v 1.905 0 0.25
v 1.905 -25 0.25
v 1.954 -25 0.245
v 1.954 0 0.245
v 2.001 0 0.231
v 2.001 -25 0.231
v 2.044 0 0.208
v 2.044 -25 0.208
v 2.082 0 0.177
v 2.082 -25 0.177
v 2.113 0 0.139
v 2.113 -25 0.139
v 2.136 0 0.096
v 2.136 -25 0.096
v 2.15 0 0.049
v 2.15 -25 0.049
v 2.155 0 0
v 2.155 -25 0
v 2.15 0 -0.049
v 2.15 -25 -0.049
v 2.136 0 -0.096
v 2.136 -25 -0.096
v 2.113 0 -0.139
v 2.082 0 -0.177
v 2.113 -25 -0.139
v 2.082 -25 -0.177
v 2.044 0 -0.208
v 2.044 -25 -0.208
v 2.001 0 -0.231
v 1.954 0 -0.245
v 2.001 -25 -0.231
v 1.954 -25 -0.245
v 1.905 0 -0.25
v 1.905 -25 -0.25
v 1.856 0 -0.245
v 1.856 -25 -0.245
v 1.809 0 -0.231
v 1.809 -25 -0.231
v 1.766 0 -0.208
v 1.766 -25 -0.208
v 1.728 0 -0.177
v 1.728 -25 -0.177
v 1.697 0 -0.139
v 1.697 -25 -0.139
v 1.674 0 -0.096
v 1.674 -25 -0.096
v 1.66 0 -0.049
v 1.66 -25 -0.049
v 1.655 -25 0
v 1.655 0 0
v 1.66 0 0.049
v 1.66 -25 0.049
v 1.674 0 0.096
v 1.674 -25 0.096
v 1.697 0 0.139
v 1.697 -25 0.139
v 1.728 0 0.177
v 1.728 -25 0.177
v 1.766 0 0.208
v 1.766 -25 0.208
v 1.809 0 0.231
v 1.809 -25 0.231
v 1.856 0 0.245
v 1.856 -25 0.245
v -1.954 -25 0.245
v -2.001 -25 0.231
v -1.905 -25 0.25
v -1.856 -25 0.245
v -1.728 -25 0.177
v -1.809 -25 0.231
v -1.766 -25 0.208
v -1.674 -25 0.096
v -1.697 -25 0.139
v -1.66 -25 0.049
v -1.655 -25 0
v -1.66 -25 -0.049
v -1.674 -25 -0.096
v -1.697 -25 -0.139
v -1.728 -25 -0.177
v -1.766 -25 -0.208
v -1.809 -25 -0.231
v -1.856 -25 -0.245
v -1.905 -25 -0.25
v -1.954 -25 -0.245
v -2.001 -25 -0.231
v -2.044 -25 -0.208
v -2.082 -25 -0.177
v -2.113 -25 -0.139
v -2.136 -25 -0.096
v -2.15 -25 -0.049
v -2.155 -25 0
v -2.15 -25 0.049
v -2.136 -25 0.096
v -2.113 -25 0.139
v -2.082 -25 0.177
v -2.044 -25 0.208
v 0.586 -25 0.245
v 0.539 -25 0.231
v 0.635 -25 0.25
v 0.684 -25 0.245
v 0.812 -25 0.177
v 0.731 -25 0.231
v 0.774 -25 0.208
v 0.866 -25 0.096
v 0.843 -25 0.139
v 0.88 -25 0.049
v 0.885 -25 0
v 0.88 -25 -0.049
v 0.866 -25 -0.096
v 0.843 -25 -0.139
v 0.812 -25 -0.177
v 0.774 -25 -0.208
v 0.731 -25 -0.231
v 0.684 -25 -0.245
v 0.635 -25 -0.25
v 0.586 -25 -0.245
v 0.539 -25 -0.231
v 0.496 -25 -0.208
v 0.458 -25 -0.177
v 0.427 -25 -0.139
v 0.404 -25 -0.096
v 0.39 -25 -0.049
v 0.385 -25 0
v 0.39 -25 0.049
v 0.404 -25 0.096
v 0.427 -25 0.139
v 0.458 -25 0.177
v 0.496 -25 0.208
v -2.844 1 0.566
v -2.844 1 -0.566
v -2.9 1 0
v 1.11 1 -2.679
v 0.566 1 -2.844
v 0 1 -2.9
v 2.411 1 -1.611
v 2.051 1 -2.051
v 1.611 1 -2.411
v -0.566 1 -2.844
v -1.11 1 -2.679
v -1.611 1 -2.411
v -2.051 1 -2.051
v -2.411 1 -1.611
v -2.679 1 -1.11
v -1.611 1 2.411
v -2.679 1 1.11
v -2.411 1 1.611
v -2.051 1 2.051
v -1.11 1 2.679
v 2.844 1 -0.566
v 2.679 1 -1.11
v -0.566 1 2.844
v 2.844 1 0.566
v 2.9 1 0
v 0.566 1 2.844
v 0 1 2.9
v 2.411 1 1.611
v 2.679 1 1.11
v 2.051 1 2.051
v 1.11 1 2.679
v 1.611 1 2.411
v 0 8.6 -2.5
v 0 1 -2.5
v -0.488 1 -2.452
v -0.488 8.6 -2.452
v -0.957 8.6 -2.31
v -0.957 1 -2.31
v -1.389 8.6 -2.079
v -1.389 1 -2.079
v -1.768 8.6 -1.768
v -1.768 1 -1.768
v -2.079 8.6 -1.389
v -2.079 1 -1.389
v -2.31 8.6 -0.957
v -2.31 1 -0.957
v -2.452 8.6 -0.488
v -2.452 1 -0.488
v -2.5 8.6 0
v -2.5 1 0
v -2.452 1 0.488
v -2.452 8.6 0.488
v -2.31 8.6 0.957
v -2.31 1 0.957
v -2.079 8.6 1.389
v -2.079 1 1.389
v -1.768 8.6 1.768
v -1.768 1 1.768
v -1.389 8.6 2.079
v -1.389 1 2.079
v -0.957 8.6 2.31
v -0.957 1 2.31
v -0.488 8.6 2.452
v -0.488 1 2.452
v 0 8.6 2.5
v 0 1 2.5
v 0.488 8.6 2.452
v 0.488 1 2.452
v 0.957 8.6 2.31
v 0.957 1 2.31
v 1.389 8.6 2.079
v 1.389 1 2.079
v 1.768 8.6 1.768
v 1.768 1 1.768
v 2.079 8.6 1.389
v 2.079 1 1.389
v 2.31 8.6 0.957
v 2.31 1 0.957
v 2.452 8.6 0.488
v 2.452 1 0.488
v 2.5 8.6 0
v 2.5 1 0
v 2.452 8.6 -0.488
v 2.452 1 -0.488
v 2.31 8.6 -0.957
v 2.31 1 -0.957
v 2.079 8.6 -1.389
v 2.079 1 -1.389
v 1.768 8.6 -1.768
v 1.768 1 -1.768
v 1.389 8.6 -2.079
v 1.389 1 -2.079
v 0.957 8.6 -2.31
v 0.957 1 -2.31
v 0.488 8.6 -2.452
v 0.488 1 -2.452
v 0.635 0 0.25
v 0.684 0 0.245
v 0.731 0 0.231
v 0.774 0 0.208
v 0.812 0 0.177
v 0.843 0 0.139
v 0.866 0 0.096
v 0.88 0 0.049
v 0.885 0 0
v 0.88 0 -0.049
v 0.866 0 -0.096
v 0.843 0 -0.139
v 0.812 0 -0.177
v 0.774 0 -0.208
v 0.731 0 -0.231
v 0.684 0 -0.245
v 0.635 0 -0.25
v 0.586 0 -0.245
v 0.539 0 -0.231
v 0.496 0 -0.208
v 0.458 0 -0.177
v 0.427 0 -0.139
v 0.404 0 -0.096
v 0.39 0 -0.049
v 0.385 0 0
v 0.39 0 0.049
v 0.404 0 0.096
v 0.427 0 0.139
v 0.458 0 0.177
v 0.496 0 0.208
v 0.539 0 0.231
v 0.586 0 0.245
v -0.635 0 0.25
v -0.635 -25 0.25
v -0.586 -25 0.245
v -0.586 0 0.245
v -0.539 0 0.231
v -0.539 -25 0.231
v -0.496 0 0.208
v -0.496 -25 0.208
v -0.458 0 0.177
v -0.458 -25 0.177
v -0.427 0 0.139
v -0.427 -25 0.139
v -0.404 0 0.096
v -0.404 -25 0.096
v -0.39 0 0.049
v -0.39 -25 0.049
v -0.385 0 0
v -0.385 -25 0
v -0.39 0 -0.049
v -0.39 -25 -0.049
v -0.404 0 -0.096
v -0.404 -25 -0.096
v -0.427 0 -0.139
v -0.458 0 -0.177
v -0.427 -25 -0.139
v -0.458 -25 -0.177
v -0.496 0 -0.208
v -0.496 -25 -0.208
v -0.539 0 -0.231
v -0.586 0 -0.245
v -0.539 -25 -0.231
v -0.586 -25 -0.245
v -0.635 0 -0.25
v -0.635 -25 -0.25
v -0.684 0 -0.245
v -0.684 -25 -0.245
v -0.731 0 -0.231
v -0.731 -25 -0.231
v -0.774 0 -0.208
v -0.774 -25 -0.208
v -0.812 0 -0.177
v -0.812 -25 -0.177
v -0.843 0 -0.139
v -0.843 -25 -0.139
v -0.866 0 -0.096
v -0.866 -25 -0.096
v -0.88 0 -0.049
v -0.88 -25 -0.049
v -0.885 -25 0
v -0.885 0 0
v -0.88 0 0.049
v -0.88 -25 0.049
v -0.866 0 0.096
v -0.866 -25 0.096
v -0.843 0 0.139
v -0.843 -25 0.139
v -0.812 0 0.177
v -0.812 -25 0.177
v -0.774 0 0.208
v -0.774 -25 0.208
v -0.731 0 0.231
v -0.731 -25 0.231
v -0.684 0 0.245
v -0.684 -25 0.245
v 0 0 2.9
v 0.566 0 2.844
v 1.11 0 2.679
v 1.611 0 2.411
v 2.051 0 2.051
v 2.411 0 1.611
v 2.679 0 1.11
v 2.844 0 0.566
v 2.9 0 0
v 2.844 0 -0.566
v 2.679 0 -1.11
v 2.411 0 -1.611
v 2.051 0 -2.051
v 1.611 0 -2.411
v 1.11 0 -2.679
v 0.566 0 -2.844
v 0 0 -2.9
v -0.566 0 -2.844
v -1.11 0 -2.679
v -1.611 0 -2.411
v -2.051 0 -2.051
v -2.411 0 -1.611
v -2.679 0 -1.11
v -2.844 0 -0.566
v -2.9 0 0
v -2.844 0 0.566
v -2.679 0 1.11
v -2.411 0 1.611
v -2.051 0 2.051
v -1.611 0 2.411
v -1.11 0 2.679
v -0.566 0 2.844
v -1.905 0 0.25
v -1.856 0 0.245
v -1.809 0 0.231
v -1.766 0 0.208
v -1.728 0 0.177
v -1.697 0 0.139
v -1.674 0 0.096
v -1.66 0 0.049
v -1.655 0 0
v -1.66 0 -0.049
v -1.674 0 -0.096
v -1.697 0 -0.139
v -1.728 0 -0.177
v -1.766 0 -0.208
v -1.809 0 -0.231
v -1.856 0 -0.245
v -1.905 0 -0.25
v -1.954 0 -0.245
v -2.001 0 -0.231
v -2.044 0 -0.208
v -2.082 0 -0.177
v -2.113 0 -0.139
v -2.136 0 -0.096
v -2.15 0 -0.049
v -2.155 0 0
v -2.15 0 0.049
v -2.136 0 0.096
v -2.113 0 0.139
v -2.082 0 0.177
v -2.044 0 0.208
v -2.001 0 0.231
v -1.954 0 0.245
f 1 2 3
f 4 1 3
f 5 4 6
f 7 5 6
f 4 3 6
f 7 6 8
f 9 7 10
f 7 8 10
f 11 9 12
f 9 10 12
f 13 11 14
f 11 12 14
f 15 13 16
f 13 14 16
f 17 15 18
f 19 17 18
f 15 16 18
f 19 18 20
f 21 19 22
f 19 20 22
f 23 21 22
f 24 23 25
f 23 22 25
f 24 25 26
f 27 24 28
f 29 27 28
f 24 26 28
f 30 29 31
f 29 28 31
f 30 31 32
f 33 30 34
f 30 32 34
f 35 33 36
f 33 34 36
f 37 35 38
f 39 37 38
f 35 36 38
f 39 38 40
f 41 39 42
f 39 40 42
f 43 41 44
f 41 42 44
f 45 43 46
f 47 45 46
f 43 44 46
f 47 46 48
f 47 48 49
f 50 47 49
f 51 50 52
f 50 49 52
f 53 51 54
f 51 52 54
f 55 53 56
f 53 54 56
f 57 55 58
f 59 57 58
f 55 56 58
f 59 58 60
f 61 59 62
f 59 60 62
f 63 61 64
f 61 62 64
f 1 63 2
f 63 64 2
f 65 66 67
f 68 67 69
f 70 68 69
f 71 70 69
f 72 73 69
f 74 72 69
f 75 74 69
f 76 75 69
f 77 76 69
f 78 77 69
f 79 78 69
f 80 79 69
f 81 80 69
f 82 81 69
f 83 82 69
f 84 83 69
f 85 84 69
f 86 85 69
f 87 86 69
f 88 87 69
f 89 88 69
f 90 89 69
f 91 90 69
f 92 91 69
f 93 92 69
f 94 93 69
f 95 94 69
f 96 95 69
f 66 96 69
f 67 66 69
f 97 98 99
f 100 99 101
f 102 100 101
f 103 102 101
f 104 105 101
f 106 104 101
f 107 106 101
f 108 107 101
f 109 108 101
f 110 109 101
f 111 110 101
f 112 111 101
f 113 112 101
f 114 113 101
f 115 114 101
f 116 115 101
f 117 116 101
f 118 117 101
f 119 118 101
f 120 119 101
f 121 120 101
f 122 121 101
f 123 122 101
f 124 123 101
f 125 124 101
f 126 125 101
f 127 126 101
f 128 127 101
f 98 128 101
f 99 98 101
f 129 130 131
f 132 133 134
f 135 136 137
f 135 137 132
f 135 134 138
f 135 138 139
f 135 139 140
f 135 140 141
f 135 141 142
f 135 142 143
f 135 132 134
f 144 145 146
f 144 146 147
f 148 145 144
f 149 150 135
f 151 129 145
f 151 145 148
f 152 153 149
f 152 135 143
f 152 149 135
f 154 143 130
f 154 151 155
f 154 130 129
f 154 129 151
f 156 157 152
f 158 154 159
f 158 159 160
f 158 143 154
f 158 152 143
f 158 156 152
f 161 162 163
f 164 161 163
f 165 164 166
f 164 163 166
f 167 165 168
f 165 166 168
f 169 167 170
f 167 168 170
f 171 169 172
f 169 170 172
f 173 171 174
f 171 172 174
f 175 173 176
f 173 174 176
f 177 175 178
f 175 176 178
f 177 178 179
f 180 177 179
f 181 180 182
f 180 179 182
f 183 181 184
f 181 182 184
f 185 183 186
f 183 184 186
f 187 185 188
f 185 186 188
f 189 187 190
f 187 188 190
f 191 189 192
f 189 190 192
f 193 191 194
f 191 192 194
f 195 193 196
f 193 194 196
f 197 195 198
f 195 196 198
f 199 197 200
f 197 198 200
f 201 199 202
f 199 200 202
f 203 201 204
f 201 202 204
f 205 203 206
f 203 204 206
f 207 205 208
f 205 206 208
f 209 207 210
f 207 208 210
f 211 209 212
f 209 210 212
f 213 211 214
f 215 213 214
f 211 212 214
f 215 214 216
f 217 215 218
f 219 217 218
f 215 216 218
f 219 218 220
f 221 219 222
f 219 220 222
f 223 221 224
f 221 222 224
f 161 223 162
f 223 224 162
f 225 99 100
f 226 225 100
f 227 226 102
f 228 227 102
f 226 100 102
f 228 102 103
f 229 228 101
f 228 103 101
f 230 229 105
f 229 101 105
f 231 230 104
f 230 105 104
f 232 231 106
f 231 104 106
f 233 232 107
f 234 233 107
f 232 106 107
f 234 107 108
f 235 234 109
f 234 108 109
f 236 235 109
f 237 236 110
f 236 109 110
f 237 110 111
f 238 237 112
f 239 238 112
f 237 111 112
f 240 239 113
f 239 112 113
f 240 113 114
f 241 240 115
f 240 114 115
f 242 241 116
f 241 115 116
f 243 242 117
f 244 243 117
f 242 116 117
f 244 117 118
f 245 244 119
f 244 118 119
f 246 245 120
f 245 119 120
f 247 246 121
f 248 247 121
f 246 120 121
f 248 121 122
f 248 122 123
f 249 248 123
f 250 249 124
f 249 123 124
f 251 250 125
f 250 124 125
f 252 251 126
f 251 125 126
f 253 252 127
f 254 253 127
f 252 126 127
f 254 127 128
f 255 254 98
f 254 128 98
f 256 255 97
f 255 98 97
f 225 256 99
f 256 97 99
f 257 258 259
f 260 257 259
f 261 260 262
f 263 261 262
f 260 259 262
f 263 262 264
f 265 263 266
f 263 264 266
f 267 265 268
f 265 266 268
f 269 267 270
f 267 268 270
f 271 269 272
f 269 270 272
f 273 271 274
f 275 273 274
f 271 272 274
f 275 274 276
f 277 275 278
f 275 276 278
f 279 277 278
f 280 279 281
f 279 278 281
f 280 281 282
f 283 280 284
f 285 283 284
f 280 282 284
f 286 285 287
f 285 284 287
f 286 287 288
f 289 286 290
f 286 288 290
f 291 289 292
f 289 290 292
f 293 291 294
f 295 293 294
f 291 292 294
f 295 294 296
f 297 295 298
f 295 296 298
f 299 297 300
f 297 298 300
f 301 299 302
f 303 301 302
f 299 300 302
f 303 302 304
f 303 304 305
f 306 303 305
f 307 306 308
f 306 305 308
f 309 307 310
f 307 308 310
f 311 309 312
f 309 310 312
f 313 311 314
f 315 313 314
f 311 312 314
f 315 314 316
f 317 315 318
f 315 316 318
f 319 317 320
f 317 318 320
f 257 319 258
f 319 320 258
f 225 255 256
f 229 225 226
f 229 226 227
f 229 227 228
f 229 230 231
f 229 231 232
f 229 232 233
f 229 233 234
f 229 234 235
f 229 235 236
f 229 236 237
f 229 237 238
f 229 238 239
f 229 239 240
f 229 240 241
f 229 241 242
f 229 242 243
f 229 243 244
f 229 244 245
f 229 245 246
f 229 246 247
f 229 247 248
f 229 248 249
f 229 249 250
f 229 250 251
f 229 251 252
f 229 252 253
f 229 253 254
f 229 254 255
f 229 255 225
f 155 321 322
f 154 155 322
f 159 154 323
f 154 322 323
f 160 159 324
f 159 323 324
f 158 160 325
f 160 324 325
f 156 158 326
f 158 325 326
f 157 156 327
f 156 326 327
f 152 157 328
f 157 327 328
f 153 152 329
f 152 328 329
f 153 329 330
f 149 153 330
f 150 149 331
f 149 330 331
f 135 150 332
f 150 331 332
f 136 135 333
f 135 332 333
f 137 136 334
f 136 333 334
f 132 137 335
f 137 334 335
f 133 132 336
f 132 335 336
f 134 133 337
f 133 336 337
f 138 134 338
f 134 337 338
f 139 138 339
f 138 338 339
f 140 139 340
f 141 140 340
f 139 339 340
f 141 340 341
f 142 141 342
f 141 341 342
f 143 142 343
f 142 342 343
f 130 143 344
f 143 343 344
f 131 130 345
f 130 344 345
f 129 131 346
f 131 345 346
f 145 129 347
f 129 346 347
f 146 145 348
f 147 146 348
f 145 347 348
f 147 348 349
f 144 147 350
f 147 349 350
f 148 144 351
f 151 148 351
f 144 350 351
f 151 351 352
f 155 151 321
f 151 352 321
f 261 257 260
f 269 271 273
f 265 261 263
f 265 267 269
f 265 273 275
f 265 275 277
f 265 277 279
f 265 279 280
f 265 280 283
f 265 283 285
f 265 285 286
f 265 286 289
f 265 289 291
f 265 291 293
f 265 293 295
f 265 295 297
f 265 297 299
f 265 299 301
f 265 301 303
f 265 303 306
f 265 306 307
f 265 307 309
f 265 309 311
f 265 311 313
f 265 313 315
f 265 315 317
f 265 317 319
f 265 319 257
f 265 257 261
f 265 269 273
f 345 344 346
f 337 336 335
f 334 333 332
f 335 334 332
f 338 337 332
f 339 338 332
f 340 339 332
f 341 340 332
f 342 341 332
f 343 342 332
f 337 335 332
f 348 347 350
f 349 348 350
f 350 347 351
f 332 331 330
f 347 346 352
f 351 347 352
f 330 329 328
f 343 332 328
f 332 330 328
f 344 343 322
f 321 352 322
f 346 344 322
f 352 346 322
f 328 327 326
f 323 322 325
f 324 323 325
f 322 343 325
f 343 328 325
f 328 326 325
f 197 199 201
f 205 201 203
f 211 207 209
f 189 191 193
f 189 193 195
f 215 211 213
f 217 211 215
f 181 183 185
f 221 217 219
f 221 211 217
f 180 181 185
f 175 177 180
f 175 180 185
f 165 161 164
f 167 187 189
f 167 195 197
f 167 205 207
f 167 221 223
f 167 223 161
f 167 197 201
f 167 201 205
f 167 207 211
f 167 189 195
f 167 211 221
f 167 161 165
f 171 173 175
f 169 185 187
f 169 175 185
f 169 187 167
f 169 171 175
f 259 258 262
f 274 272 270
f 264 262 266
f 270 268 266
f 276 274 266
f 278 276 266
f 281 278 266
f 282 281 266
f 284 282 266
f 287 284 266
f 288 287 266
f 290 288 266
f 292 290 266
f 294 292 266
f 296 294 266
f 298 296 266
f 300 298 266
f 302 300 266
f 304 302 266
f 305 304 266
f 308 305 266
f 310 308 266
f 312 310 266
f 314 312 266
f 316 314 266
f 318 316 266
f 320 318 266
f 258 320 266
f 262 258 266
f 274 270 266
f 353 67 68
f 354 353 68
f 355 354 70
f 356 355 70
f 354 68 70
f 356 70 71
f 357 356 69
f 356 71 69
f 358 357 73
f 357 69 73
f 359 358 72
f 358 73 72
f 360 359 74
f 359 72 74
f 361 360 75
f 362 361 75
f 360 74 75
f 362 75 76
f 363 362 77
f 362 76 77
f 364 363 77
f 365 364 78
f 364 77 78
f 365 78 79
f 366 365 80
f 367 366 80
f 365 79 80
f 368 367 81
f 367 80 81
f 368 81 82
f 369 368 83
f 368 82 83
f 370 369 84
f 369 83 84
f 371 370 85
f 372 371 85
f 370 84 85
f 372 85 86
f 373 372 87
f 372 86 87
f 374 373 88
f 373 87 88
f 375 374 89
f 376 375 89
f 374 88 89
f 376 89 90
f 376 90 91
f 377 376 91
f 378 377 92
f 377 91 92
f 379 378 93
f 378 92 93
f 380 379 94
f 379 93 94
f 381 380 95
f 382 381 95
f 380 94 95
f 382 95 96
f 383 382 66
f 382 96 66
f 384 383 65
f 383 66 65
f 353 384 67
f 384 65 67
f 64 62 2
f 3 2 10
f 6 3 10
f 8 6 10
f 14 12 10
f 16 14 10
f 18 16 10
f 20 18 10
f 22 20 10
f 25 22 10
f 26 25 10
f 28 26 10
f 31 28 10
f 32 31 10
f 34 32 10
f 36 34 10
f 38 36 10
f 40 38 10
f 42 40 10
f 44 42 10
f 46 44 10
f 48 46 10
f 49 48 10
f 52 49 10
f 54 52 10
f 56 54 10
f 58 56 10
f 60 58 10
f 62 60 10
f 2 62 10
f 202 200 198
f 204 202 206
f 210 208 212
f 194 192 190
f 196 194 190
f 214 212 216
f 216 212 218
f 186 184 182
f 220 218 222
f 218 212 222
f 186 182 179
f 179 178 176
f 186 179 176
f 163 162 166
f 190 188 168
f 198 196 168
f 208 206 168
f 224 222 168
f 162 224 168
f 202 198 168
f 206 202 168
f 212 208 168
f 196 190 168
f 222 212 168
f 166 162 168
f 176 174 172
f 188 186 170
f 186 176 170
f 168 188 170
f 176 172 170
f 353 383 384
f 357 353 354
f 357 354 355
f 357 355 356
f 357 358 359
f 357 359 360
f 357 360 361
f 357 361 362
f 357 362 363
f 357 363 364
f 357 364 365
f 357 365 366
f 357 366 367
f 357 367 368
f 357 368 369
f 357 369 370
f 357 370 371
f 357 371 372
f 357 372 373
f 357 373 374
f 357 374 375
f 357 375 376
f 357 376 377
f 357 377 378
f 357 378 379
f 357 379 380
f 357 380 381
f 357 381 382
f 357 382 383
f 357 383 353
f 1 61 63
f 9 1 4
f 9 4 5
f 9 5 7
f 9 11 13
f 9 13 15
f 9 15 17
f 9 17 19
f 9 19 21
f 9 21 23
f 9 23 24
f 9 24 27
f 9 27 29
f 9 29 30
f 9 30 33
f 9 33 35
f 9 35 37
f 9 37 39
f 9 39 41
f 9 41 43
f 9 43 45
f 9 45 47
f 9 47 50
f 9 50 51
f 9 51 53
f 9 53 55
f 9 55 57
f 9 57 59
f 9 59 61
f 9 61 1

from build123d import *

# Parameters (mm, degrees)
LEADS_START   = -25
SK_LEADS_R    = 0.25
LEADS_DEPTH   = 25
LEADS_2_DEPTH = 25
LEADS_3_DEPTH = 25
LEADS_4_DEPTH = 25
SK_FLANGE_R   = 2.9
FLANGE_DEPTH  = 1
LENS_START    = 1
SK_LENS_R     = 2.5
LENS_DEPTH    = 7.6


with BuildPart() as part:
    # SK Leads → Leads (new body)
    with BuildSketch(Plane(origin=(0, 0, 0), x_dir=(1, 0, 0), z_dir=(0, 1, 0)).offset(LEADS_START)):
        with Locations(Location((-1.905, 0, 0), (0, 0, 270))):
            Circle(SK_LEADS_R)
    extrude(amount=LEADS_DEPTH)


with BuildPart() as body_2:
    # SK Leads → Leads 2 (new body)
    with BuildSketch(Plane(origin=(0, 0, 0), x_dir=(1, 0, 0), z_dir=(0, 1, 0)).offset(LEADS_START)):
        with Locations(Location((-0.635, 0, 0), (0, 0, 270))):
            Circle(SK_LEADS_R)
    extrude(amount=LEADS_2_DEPTH)


with BuildPart() as body_3:
    # SK Leads → Leads 3 (new body)
    with BuildSketch(Plane(origin=(0, 0, 0), x_dir=(1, 0, 0), z_dir=(0, 1, 0)).offset(LEADS_START)):
        with Locations(Location((0.635, 0, 0), (0, 0, 270))):
            Circle(SK_LEADS_R)
    extrude(amount=LEADS_3_DEPTH)


with BuildPart() as body_4:
    # SK Leads → Leads 4 (new body)
    with BuildSketch(Plane(origin=(0, 0, 0), x_dir=(1, 0, 0), z_dir=(0, 1, 0)).offset(LEADS_START)):
        with Locations(Location((1.905, 0, 0), (0, 0, 270))):
            Circle(SK_LEADS_R)
    extrude(amount=LEADS_4_DEPTH)


with BuildPart() as body_5:
    # SK Flange → Flange (new body)
    with BuildSketch(Plane(origin=(0, 0, 0), x_dir=(1, 0, 0), z_dir=(0, 1, 0))):
        with Locations(Location((0, 0, 0), (0, 0, 270))):
            Circle(SK_FLANGE_R)
    extrude(amount=FLANGE_DEPTH)


with BuildPart() as body_6:
    # SK Lens → Lens (new body)
    with BuildSketch(Plane(origin=(0, 0, 0), x_dir=(1, 0, 0), z_dir=(0, 1, 0)).offset(LENS_START)):
        with Locations(Location((0, 0, 0), (0, 0, 90))):
            Circle(SK_LENS_R)
    extrude(amount=LENS_DEPTH)


solid = Compound([part.part, body_2.part, body_3.part, body_4.part, body_5.part, body_6.part])
